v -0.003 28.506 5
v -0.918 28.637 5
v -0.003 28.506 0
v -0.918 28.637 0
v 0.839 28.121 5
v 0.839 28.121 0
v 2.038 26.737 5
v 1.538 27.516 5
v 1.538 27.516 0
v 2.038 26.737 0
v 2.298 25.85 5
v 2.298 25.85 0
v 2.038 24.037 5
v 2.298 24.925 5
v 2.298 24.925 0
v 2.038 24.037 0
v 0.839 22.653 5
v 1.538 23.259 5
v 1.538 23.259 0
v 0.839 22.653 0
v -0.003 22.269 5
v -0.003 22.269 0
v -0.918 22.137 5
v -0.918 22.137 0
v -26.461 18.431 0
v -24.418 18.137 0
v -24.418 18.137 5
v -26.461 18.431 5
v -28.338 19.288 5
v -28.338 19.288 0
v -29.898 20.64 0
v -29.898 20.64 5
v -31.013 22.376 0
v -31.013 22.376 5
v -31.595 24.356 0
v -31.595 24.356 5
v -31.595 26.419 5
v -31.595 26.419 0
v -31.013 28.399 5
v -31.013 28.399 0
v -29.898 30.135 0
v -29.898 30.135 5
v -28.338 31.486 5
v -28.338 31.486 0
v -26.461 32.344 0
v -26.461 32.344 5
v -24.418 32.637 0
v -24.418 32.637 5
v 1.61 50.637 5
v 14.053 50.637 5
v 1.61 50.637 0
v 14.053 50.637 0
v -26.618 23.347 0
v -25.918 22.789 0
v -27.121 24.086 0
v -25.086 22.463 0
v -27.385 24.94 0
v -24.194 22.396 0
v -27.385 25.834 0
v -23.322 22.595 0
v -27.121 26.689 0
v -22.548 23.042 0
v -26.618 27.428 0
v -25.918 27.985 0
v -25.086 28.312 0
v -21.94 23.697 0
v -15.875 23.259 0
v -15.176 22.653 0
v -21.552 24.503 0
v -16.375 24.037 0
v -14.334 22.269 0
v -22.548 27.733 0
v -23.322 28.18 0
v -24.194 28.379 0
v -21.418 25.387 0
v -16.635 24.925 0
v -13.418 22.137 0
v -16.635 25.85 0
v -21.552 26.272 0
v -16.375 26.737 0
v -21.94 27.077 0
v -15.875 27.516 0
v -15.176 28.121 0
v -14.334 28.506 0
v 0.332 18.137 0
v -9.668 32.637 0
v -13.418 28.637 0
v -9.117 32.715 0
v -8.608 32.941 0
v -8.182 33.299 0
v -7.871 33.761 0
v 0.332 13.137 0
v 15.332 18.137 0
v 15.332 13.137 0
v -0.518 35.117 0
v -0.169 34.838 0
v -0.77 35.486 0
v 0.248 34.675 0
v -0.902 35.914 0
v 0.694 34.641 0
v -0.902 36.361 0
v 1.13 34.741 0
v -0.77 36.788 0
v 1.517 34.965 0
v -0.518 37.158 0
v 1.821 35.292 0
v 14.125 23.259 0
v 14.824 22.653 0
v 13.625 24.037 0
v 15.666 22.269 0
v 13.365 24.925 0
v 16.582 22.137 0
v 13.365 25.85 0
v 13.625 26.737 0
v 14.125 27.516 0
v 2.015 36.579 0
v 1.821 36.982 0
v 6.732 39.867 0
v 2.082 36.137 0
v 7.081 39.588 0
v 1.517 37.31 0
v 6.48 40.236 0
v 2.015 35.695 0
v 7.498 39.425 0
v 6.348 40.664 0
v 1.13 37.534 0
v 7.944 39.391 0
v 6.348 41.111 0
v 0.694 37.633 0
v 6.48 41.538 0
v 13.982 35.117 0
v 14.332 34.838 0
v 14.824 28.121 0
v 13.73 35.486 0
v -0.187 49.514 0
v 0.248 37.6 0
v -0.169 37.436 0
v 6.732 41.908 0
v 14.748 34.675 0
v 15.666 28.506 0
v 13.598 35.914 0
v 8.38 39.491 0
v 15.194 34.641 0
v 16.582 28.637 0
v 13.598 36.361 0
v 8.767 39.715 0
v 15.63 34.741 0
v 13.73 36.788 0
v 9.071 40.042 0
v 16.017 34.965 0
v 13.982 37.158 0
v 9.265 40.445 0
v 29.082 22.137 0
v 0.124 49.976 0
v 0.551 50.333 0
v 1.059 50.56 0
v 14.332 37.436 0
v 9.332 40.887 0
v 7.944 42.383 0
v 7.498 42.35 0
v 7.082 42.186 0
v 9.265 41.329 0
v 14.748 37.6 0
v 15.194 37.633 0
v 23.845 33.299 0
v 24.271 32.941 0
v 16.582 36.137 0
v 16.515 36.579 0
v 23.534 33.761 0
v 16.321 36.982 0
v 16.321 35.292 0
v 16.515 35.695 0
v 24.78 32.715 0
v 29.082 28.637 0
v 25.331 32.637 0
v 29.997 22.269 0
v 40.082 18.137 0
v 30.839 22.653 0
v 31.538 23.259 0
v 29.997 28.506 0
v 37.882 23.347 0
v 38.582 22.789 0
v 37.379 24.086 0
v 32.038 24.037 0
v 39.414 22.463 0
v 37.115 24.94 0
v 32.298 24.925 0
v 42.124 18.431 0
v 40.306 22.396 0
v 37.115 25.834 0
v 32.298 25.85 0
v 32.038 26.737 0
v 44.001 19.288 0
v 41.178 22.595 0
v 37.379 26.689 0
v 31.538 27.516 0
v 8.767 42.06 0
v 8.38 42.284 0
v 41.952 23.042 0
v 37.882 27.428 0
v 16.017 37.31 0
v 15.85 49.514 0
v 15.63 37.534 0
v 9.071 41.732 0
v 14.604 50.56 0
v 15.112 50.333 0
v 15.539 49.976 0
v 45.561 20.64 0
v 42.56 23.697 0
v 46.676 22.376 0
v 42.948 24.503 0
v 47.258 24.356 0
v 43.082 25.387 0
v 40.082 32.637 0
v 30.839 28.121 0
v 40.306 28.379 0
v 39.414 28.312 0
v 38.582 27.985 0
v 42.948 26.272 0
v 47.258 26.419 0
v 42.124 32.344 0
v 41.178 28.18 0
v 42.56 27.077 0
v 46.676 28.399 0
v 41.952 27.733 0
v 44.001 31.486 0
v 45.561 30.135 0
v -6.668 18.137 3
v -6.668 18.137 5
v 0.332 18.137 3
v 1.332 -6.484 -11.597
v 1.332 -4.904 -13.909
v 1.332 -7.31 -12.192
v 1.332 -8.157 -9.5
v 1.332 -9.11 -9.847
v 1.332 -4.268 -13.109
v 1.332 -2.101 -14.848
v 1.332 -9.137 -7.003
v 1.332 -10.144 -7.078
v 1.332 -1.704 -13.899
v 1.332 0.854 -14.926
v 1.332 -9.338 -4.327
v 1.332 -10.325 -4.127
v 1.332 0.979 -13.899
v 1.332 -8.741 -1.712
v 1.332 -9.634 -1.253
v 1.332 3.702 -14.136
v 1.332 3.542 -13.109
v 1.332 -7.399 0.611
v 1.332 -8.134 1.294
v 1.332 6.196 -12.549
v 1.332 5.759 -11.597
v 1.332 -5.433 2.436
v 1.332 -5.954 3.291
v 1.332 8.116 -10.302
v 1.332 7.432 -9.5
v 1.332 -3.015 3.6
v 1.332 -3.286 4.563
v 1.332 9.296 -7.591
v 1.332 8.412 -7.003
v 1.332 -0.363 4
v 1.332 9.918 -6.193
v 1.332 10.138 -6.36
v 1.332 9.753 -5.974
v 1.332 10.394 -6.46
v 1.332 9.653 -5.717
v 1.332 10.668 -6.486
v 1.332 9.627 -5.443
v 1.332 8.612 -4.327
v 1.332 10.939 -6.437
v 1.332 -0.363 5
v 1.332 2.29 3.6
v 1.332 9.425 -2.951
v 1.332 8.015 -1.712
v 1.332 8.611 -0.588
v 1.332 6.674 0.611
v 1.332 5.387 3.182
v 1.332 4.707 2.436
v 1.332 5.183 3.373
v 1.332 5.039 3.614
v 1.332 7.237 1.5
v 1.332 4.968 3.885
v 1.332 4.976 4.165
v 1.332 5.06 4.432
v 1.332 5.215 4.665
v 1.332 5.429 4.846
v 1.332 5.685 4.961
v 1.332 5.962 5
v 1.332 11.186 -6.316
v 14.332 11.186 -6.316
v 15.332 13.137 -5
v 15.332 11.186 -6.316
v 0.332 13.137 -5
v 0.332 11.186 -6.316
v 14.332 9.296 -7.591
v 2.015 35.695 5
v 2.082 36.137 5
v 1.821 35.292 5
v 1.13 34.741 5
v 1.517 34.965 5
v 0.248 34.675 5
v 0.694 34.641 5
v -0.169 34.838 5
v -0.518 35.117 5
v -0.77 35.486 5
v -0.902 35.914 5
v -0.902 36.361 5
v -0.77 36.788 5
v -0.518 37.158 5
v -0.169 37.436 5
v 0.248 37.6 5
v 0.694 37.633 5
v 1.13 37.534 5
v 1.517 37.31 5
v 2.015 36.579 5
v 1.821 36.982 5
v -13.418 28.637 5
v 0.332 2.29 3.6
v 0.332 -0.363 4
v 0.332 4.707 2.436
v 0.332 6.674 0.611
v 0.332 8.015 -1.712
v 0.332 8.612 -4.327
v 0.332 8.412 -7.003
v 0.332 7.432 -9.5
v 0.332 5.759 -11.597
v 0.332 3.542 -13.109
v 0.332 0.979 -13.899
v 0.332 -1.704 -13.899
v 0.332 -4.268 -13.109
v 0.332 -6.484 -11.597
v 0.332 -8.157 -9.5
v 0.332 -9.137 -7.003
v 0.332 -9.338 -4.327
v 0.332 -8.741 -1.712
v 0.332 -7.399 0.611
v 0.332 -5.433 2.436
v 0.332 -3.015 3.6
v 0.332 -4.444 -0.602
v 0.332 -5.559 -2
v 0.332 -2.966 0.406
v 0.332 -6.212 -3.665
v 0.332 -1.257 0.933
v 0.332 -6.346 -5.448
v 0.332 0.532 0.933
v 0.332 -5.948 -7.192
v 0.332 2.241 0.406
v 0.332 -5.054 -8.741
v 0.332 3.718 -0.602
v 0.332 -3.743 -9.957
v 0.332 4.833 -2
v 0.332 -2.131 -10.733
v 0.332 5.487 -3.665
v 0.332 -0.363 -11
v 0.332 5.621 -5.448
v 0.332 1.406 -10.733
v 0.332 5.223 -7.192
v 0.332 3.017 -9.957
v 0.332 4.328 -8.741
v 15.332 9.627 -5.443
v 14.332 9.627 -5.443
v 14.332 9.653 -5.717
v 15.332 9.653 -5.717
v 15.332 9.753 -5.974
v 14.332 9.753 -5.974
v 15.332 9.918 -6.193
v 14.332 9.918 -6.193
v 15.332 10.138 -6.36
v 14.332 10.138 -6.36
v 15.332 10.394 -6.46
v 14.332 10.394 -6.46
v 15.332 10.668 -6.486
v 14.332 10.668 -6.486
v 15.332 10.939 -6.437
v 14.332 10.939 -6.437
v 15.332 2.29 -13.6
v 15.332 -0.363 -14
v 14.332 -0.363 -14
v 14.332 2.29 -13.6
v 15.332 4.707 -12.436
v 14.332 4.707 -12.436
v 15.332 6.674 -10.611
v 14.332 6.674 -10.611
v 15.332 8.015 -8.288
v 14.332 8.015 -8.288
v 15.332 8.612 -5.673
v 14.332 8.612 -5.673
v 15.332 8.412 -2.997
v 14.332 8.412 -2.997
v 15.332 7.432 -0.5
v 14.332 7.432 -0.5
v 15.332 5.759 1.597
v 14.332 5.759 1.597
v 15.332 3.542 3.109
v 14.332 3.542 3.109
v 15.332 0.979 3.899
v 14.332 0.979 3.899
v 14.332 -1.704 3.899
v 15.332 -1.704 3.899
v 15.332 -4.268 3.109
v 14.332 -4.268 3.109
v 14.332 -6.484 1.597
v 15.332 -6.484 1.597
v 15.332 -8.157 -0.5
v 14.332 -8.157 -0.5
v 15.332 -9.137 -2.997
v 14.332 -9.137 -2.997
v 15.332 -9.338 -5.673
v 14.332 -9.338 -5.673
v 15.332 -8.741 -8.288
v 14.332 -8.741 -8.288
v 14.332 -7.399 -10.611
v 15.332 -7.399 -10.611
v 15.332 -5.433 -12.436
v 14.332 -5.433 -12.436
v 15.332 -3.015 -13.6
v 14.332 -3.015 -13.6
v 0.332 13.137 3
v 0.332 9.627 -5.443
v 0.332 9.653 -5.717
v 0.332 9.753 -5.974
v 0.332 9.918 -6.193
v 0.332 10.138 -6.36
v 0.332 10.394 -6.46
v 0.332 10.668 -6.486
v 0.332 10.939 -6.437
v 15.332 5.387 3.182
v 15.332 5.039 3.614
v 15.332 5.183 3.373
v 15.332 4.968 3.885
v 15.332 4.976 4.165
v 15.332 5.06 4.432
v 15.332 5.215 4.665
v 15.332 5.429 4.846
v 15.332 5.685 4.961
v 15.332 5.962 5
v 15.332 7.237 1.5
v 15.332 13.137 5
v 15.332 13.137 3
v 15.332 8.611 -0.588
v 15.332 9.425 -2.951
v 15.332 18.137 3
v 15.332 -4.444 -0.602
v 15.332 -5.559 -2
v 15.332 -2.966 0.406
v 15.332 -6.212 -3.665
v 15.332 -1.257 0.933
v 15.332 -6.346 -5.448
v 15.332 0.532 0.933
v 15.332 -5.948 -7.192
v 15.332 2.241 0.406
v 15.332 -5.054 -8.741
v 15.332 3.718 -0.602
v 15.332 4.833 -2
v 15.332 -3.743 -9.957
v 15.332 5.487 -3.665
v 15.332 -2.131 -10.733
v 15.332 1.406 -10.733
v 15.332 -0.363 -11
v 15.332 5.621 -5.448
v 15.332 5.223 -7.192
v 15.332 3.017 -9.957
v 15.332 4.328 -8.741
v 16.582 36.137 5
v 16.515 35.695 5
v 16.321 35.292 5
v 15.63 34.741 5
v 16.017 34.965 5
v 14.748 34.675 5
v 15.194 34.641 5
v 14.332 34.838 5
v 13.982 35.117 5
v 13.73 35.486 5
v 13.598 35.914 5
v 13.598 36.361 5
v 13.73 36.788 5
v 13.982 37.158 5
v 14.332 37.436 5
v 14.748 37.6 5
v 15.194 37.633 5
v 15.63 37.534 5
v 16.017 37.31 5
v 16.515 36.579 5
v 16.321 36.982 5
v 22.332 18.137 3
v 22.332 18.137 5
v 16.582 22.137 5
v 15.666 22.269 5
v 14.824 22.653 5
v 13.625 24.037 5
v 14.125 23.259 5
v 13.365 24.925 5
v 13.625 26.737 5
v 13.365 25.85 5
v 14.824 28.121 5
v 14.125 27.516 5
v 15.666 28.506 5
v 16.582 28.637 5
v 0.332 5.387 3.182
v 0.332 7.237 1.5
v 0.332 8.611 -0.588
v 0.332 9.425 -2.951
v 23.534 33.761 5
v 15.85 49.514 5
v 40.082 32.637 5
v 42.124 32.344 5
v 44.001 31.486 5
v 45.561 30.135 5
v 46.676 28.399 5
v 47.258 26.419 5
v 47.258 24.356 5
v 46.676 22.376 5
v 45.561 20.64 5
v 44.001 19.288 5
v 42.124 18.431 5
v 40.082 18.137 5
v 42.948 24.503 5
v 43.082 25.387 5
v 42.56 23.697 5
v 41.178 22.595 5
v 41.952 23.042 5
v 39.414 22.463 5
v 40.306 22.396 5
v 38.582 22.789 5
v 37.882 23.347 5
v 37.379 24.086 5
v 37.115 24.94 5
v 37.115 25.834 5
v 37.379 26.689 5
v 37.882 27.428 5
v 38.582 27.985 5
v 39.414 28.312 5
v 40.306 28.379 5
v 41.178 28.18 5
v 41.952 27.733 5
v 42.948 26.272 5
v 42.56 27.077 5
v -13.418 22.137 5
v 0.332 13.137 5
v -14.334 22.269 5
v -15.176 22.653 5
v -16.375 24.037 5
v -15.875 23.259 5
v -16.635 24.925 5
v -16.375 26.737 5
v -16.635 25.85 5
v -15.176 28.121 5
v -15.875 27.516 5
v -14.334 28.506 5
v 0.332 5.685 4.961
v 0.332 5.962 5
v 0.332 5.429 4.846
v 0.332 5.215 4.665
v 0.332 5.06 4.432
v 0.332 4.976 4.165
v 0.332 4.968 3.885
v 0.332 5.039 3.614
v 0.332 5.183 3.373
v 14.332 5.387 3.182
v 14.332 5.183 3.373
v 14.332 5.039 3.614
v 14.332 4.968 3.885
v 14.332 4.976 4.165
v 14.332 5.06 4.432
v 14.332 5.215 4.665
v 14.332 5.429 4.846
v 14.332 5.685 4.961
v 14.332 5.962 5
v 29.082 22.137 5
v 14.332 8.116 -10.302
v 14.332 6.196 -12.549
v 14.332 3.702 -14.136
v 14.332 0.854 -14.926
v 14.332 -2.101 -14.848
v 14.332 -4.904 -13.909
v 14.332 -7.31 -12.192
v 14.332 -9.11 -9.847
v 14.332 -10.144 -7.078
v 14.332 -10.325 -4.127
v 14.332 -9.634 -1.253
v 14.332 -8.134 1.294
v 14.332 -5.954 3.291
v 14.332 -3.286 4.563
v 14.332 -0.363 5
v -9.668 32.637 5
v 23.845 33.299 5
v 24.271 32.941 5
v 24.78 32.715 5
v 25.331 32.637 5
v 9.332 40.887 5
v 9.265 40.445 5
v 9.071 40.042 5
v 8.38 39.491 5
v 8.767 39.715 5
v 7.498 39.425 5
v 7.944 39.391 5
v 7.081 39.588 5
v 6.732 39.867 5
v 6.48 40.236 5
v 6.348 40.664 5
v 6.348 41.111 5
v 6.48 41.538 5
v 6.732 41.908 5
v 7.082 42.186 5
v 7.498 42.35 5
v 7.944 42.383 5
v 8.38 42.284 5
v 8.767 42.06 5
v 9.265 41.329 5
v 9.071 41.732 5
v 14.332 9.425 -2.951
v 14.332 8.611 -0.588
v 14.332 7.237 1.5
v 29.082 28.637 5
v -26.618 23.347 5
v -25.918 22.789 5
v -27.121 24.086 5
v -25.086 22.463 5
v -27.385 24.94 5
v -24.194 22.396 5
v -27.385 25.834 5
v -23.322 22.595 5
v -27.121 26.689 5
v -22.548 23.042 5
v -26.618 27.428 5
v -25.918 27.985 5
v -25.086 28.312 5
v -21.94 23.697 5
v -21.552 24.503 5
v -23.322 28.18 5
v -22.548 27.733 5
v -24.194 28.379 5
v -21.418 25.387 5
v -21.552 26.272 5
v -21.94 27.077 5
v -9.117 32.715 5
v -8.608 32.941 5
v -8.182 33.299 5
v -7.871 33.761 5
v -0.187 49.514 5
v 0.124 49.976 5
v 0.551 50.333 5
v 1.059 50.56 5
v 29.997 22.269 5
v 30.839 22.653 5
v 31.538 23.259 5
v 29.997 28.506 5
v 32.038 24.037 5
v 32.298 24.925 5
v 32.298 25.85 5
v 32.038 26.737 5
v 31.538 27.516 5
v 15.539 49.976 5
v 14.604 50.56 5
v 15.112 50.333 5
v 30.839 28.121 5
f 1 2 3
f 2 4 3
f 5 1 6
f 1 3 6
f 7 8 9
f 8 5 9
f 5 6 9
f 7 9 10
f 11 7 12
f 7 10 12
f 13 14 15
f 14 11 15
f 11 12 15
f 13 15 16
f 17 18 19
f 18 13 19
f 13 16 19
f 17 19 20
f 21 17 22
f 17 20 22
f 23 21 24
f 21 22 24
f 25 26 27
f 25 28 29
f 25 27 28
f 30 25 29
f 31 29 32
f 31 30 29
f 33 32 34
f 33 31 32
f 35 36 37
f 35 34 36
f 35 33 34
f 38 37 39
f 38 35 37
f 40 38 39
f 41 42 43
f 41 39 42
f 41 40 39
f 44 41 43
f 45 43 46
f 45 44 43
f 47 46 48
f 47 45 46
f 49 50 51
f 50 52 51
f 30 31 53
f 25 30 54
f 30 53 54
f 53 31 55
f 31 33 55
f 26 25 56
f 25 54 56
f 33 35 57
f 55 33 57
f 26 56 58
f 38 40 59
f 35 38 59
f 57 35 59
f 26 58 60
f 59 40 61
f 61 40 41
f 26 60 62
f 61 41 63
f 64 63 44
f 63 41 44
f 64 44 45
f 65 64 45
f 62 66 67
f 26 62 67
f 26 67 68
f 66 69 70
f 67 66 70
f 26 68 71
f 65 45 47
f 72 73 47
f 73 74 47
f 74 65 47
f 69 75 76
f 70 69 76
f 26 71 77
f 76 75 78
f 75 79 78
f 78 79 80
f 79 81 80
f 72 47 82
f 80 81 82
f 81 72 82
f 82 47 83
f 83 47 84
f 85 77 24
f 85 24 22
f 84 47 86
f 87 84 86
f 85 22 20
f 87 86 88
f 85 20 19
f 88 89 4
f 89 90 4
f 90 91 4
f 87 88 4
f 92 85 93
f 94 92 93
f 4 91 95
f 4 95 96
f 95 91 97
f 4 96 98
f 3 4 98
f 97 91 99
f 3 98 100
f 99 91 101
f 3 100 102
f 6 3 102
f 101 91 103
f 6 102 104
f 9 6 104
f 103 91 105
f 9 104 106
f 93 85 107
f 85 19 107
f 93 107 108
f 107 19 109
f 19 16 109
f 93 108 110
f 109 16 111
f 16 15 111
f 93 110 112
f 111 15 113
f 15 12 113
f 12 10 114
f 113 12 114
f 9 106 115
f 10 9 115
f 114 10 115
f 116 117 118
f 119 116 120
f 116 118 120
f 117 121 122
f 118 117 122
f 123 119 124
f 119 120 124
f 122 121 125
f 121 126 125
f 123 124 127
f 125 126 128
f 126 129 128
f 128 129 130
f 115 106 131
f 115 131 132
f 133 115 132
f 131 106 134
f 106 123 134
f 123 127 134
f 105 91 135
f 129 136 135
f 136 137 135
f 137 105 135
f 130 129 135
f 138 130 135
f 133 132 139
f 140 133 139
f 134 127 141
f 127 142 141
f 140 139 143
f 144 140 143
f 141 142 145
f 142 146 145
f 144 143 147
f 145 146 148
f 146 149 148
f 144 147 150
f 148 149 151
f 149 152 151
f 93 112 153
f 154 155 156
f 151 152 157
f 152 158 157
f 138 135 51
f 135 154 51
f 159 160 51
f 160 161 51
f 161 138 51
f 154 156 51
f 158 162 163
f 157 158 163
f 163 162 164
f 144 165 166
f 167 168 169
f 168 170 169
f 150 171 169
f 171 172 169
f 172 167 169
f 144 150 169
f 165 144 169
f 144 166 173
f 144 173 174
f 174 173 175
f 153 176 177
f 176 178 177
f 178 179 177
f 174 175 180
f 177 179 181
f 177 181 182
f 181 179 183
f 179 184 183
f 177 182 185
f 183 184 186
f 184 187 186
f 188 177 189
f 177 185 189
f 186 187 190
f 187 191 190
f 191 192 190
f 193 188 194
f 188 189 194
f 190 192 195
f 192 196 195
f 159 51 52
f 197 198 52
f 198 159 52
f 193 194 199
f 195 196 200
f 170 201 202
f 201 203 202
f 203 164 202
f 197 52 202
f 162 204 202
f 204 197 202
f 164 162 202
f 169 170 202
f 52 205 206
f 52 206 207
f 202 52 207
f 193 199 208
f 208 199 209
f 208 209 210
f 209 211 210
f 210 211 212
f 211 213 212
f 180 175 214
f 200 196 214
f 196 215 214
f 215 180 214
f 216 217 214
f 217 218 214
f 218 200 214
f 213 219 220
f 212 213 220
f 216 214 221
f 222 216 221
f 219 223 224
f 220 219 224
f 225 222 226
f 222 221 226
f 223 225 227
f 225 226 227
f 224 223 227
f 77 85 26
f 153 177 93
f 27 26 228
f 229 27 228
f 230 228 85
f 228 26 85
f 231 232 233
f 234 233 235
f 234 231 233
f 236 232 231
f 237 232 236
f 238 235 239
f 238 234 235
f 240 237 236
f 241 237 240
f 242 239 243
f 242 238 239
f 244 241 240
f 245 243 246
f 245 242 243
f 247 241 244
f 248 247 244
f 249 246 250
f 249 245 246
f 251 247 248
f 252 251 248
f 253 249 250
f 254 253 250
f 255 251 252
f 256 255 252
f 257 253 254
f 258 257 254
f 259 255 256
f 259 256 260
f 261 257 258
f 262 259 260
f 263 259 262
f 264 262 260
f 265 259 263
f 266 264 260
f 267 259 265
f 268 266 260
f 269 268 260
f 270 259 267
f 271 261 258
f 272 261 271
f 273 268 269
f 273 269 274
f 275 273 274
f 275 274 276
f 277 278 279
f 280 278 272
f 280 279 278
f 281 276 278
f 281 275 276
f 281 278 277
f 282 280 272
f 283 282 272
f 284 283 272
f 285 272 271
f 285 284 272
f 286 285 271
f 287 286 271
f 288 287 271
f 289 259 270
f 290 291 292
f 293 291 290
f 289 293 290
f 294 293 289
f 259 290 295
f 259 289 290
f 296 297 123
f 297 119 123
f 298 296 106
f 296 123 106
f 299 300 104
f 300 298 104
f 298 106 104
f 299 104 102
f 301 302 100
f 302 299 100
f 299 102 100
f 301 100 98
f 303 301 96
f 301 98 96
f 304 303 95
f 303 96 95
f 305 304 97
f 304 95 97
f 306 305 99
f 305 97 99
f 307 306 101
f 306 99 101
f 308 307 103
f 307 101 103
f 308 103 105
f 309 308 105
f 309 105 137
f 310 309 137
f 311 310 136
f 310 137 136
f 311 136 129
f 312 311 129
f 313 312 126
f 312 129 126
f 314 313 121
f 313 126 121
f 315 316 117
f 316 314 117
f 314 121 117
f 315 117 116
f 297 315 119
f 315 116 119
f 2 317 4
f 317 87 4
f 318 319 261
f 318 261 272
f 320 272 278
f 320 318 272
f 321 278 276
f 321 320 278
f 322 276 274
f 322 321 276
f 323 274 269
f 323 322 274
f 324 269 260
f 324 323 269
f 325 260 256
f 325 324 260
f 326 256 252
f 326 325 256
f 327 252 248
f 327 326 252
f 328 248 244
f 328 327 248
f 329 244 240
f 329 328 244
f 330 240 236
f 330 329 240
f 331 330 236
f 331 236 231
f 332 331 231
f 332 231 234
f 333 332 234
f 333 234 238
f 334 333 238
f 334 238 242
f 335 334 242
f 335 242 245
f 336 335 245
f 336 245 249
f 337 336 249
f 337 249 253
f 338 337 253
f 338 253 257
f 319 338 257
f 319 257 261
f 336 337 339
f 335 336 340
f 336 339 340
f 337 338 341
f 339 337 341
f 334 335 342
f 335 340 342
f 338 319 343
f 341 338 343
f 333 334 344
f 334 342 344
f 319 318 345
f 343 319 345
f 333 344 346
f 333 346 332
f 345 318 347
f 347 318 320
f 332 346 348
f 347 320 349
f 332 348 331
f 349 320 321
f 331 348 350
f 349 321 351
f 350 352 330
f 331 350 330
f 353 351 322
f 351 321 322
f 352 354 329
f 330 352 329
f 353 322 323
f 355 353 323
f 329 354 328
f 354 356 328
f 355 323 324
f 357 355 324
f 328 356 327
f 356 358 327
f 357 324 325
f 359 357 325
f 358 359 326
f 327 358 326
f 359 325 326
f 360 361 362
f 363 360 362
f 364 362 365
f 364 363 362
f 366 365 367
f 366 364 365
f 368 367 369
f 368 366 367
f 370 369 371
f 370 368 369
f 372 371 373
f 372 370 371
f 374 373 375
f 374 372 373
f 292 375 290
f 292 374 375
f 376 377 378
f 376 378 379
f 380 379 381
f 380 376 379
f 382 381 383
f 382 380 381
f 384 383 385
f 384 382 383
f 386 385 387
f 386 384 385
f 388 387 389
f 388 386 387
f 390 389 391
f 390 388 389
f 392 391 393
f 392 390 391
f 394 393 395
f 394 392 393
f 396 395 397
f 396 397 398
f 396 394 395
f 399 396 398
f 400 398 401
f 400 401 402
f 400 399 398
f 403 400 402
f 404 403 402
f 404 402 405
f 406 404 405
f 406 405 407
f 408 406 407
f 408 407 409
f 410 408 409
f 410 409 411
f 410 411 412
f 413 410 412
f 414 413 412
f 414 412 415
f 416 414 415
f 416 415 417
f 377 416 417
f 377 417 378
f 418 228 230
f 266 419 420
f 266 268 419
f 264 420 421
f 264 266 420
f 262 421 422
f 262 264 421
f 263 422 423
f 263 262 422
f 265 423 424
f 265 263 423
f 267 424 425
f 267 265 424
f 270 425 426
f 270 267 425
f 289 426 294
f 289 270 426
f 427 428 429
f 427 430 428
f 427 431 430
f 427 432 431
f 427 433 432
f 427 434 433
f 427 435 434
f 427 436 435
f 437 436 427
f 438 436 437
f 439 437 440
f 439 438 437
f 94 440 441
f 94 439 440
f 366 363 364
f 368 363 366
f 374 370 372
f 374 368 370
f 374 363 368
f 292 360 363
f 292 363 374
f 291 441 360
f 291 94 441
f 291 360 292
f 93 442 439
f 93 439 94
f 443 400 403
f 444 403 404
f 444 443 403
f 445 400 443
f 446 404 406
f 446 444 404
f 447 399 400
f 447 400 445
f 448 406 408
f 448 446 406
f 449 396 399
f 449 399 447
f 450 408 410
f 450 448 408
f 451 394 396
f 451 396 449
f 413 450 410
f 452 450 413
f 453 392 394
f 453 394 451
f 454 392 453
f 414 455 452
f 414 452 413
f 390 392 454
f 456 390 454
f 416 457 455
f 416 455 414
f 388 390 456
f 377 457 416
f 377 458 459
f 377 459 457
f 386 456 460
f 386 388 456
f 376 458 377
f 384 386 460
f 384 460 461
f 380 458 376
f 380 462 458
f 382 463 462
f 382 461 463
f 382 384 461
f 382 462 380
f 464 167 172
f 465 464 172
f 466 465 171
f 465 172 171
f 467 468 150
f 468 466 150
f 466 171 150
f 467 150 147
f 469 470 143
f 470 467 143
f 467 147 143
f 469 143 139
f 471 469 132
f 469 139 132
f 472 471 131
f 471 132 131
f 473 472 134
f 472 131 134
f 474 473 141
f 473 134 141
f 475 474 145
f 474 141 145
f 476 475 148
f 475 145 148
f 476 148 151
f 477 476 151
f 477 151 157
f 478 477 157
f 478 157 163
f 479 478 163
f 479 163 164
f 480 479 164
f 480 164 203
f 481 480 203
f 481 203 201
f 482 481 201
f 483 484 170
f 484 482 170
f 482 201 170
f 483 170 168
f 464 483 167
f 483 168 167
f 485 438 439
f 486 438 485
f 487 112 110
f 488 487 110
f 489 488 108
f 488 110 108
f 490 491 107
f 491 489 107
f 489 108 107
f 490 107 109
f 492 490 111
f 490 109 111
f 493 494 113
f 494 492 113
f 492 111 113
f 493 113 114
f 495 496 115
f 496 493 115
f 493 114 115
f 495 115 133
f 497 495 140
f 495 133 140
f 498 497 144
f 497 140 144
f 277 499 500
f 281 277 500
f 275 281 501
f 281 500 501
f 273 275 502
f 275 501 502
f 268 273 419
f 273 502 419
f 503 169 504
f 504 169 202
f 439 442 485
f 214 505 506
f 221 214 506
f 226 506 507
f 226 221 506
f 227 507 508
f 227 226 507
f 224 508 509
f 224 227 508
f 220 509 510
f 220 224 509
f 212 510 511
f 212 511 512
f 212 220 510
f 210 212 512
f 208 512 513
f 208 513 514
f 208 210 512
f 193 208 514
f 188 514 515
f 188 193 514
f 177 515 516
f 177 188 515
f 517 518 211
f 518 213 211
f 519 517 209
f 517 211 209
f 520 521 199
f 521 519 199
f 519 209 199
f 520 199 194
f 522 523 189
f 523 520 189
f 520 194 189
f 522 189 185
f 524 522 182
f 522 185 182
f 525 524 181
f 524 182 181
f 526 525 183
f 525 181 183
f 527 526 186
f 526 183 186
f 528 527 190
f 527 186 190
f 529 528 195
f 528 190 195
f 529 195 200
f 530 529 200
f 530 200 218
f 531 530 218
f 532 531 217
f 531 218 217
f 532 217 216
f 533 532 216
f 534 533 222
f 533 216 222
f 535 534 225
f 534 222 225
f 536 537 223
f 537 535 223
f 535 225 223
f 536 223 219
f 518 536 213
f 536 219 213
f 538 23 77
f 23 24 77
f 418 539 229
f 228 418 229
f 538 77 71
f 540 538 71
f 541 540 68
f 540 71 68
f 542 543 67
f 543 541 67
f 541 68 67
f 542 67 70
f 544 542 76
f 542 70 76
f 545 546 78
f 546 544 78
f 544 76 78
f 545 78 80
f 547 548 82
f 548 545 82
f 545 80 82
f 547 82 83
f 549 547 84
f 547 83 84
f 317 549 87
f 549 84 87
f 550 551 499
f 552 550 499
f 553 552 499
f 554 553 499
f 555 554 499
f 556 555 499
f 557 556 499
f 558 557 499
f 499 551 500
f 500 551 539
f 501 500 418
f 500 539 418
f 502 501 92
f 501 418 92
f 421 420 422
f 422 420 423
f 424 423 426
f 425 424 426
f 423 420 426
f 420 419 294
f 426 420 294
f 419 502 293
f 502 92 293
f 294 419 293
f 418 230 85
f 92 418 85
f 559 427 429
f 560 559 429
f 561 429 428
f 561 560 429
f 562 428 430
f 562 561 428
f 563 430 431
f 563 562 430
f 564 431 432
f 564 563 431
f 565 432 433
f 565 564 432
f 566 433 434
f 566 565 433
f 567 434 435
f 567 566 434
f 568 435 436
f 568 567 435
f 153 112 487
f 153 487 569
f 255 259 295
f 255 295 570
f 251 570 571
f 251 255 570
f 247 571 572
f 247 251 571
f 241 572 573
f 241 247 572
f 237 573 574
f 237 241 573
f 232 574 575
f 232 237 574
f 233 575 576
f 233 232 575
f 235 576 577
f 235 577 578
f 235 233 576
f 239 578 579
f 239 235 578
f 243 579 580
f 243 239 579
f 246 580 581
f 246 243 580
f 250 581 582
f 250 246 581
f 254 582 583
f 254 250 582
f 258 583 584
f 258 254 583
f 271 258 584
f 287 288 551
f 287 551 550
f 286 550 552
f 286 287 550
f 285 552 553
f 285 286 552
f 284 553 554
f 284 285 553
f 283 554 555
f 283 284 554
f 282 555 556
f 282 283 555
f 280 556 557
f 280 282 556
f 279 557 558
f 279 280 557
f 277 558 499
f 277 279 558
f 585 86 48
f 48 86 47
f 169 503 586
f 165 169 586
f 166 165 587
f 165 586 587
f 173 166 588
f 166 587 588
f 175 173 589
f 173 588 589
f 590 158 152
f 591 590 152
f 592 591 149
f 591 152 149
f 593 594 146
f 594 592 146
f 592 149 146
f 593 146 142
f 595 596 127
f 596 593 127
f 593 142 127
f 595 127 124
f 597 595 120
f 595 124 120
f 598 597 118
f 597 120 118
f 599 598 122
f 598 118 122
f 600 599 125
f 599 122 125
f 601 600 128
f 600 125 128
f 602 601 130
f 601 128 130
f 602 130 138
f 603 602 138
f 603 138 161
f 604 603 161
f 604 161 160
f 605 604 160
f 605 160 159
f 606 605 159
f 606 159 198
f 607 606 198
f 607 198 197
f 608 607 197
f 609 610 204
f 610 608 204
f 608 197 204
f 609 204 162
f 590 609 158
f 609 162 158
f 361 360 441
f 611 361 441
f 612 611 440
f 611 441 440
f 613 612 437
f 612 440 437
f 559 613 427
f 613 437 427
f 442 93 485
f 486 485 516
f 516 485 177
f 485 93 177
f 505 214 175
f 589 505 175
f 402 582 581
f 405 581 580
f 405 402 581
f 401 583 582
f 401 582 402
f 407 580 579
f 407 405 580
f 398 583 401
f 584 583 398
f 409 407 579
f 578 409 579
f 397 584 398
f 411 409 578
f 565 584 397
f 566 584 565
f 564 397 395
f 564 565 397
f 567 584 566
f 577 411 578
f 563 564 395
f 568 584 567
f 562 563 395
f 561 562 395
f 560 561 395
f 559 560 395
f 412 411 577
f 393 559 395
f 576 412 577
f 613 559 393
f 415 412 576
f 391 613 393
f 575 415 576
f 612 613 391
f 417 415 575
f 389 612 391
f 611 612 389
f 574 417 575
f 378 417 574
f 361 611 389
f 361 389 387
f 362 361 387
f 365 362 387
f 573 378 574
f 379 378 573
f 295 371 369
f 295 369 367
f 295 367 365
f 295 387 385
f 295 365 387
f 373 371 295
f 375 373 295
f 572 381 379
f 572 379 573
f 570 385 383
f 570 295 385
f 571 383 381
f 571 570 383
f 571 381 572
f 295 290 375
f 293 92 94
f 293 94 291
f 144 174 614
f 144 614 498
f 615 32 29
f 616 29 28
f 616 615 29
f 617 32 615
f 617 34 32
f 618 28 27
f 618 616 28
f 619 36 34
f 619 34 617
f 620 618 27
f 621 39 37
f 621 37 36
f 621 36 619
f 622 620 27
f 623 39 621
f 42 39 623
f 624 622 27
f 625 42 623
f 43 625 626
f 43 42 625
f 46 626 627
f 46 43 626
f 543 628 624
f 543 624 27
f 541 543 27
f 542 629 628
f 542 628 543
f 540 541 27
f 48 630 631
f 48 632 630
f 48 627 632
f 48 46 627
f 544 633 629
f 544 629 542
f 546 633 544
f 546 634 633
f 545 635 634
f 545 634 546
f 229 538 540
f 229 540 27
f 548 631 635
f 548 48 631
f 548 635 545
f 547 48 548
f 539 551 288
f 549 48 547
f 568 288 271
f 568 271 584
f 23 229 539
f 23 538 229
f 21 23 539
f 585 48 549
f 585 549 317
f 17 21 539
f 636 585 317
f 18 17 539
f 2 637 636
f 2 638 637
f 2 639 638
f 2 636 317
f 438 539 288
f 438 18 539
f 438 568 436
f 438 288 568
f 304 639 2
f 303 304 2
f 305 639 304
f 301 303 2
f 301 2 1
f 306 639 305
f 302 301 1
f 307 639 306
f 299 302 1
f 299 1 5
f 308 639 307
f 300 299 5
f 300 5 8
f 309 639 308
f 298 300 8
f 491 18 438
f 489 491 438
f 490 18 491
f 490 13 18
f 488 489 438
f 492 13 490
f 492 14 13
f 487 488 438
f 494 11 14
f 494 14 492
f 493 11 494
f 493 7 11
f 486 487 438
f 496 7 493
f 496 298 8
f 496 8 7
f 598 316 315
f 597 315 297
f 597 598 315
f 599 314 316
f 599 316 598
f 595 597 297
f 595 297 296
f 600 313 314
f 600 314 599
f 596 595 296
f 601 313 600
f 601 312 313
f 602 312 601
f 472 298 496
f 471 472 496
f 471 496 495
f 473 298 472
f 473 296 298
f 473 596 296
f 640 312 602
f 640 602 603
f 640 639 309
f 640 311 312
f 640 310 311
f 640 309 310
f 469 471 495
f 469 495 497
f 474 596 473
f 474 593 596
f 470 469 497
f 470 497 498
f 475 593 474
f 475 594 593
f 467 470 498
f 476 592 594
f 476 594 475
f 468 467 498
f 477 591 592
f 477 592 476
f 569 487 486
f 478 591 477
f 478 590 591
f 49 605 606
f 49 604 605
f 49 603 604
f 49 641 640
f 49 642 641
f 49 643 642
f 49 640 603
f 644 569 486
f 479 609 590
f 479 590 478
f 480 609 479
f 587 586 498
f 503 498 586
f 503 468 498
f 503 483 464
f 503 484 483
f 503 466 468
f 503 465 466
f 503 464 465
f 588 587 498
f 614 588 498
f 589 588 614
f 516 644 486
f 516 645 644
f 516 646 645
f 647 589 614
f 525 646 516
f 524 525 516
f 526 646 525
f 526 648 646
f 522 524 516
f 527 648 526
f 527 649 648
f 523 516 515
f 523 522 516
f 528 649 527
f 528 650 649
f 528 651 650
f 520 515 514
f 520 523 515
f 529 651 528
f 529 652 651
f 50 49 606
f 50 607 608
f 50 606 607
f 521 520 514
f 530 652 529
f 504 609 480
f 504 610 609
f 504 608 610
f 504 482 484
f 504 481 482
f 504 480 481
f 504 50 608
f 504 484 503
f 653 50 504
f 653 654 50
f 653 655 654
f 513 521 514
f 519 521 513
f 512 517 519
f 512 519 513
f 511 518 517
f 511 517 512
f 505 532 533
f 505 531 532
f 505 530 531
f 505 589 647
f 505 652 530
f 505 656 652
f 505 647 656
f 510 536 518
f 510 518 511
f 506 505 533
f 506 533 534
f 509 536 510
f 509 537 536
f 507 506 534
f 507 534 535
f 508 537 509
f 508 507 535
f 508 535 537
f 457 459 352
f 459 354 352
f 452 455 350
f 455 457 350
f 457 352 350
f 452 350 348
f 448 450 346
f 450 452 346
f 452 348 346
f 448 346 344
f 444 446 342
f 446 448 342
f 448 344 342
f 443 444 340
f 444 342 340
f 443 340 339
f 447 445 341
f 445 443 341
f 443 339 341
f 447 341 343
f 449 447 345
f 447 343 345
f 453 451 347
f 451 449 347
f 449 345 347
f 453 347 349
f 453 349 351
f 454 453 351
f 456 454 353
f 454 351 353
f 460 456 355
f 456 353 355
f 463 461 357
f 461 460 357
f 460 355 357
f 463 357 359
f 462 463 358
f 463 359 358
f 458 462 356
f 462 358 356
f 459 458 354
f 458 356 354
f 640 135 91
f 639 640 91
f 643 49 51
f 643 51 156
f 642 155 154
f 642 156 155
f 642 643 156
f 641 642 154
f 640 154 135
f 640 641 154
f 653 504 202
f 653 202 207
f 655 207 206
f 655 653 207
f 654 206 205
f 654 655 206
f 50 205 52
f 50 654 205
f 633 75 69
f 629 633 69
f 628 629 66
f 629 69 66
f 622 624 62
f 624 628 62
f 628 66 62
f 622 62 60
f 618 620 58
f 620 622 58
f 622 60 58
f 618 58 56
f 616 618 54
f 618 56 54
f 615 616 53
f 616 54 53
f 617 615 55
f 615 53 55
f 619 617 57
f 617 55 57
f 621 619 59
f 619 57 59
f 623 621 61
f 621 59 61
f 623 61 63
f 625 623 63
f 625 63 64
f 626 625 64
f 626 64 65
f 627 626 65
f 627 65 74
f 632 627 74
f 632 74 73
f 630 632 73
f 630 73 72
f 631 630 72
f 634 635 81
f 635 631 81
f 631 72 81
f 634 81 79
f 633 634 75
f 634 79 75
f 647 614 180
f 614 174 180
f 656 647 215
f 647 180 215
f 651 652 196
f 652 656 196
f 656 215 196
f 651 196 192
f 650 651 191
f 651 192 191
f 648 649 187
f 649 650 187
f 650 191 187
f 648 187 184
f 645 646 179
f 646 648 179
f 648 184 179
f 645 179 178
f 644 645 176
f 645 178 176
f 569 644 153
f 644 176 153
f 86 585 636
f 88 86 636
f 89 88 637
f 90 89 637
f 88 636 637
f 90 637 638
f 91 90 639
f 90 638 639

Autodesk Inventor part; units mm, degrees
ref_plane "YZ Plane" through (0, 0, 0) normal (1, 0, 0) x (0, 1, 0)
ref_plane "XZ Plane" through (0, 0, 0) normal (0, 1, 0) x (-1, 0, 0)
sketch "Body" plane through (0, 0, 0) normal (0, 0, 1) x (1, 0, 0)
  line L0 (-42.1685, 50.6373) -> (57.8315, 50.6373) construction
  line L1 (-42.1685, 50.6373) -> (-42.1685, 45.6373) construction
  line L2 (-42.1685, 45.6373) -> (-31.6685, 45.6373) construction
  line L3 (-31.6685, 45.6373) -> (-31.6685, 18.1373) construction
  line L4 (-31.6685, 18.1373) -> (-42.1685, 18.1373) construction
  line L5 (-42.1685, 18.1373) -> (-42.1685, 13.1373) construction
  line L6 (-42.1685, 13.1373) -> (57.8315, 13.1373) construction
  line L7 (57.8315, 18.1373) -> (57.8315, 13.1373) construction
  line L8 (47.3315, 18.1373) -> (57.8315, 18.1373) construction
  line L9 (47.3315, 45.6373) -> (47.3315, 18.1373) construction
  line L10 (57.8315, 45.6373) -> (47.3315, 45.6373) construction
  line L11 (57.8315, 50.6373) -> (57.8315, 45.6373) construction
  circle A0 centre (40.0815, 25.3873) radius 3.25 construction
  arc A1 (28.5815, 34.3873) -> (28.5815, 37.8873) centre (28.5815, 36.1373) ccw construction
  line L12 (15.0815, 34.3873) -> (28.5815, 34.3873) construction
  arc A2 (15.0815, 37.8873) -> (15.0815, 34.3873) centre (15.0815, 36.1373) ccw construction
  line L13 (28.5815, 37.8873) -> (15.0815, 37.8873) construction
  line L14 (29.0815, 28.6373) -> (16.5815, 28.6373) projected
  arc A3 (29.0815, 22.1373) -> (29.0815, 28.6373) centre (29.0815, 25.3873) ccw projected
  line L15 (16.5815, 22.1373) -> (29.0815, 22.1373) projected
  arc A4 (16.5815, 28.6373) -> (16.5815, 22.1373) centre (16.5815, 25.3873) ccw projected
  line L16 (-13.4185, 28.6373) -> (-0.9185, 28.6373) projected
  arc A5 (-0.9185, 22.1373) -> (-0.9185, 28.6373) centre (-0.9185, 25.3873) ccw projected
  line L17 (-0.9185, 22.1373) -> (-13.4185, 22.1373) projected
  arc A6 (-13.4185, 28.6373) -> (-13.4185, 22.1373) centre (-13.4185, 25.3873) ccw projected
  arc A7 (-12.9185, 37.8873) -> (-12.9185, 34.3873) centre (-12.9185, 36.1373) ccw construction
  line L18 (-12.9185, 37.8873) -> (0.5815, 37.8873) construction
  arc A8 (0.5815, 34.3873) -> (0.5815, 37.8873) centre (0.5815, 36.1373) ccw construction
  line L19 (0.5815, 34.3873) -> (-12.9185, 34.3873) construction
  circle A9 centre (-24.4185, 25.3873) radius 3.25 construction
  line L20 (6.8315, 42.6373) -> (8.8315, 42.6373) construction
  arc A10 (8.8315, 39.1373) -> (8.8315, 42.6373) centre (8.8315, 40.8873) ccw construction
  line L21 (6.8315, 39.1373) -> (8.8315, 39.1373) construction
  arc A11 (6.8315, 42.6373) -> (6.8315, 39.1373) centre (6.8315, 40.8873) ccw construction
  circle A12 centre (40.0815, 25.3873) radius 7.25
  circle A13 centre (-24.4185, 25.3873) radius 7.25
  line L22 (40.0815, 25.3873) -> (40.0815, 18.1373) construction
  line L23 (-24.4185, 18.1373) -> (40.0815, 18.1373)
  line L24 (-24.4185, 25.3873) -> (-24.4185, 18.1373) construction
  line L25 (40.0815, 25.3873) -> (40.0815, 32.6373) construction
  line L26 (-24.4185, 25.3873) -> (-24.4185, 32.6373) construction
  line L27 (40.0815, 32.6373) -> (24.0815, 32.6373)
  line L28 (24.0815, 32.6373) -> (15.3024, 50.6373)
  line L29 (15.3024, 50.6373) -> (0.3607, 50.6373)
  line L30 (0.3607, 50.6373) -> (-8.4185, 32.6373)
  line L31 (-8.4185, 32.6373) -> (-24.4185, 32.6373)
  line L32 (8.8315, 40.8873) -> (6.8315, 40.8873) construction
  circle A14 centre (7.8315, 40.8873) radius 1.5
  circle A15 centre (0.5815, 36.1373) radius 1.5
  circle A16 centre (15.0815, 36.1373) radius 1.5
  circle A17 centre (40.0815, 25.3873) radius 3
  circle A18 centre (-24.4185, 25.3873) radius 3
  dimension "d2" = 16
  dimension "d3" = 16
  dimension "d4" = 116
  dimension "d8" = 3
  dimension "d9" = 3
  dimension "d10" = 3
  dimension "d11" = 6
  dimension "d12" = 6
extrude "BodyFeature" add sketch "Body" along normal blind 5
fillet "BodyFilletsFeature" radius 2 4 edges at (24.0815, 32.6373, 2.5) (-8.4185, 32.6373, 2.5) (0.3607, 50.6373, 2.5) (15.3024, 50.6373, 2.5)
ref_plane "MiddlePlane" through (7.8315, 65.9547, 5) normal (1, 0, 0) x (0, 0, -1)
sketch "PelvisSpineBase" plane through (7.8315, 65.9547, 5) normal (1, 0, 0) x (0, 0, -1)
  arc A0 (0, -66.3174) -> (12.5911, -56.659) centre (10, -66.3174) ccw
  circle A1 centre (10, -66.3174) radius 6
  line L0 (5, -33.3174) -> (5, -47.8174) construction
  line L1 (5, -47.8174) -> (0, -47.8174)
  line L2 (0, -47.8174) -> (0, -66.3174)
  line L3 (5, -47.8174) -> (5, -52.8174)
  line L4 (5, -52.8174) -> (10, -52.8174)
  line L5 (10, -52.8174) -> (12.5911, -56.659)
  dimension "d16" = 12
  dimension "d17" = 4
  dimension "d22" = 5
  dimension "d23" = 5
  dimension "d29" = 18.5
  dimension "d30" = 34
extrude "PelvisSpineBaseFeature" add sketch "PelvisSpineBase" along normal mid plane 15
sketch "AngleReinforce" plane through (0, 0, 5) normal (0, 0, 1) x (1, 0, 0)
  line L0 (15.3315, 18.1373) -> (15.3315, 13.1373)
  line L1 (15.3315, 13.1373) -> (15.3315, 18.1373) projected
  line L2 (15.3315, 13.1373) -> (22.3315, 18.1373)
  line L3 (15.3315, 18.1373) -> (40.0815, 18.1373) construction
  line L4 (15.3315, 18.1373) -> (22.3315, 18.1373)
  line L5 (0.3315, 18.1373) -> (0.3315, 13.1373)
  line L6 (0.3315, 18.1373) -> (0.3315, 13.1373) projected
  line L7 (0.3315, 13.1373) -> (-6.6685, 18.1373)
  line L8 (-24.4185, 18.1373) -> (0.3315, 18.1373) construction
  line L9 (0.3315, 18.1373) -> (-6.6685, 18.1373)
  dimension "d33" = 7
  dimension "d34" = 7
extrude "AngleReinforceFeature" add sketch "AngleReinforce" against normal blind 2
sketch "RightLip" plane through (15.3315, 65.9547, 5) normal (1, 0, 0) x (0, 0, -1)
  arc A0 (0, -66.3174) -> (12.5911, -56.659) centre (10, -66.3174) ccw projected
  circle A1 centre (10, -66.3174) radius 10
  circle A2 centre (10, -66.3174) radius 9
  dimension "d37" = 1
extrude "RightLipFeature" cut sketch "RightLip" against normal blind 1
sketch "LeftLip" plane through (0.3315, 65.9547, 5) normal (-1, 0, 0) x (0, 0, 1)
  arc A0 (-12.5911, -56.659) -> (0, -66.3174) centre (-10, -66.3174) ccw projected
  circle A1 centre (-10, -66.3174) radius 9
  circle A2 centre (-10, -66.3174) radius 10
  dimension "d40" = 1
extrude "LeftLipFeature" cut sketch "LeftLip" against normal blind 1
fillet "SharpEdgesFilletFeature" radius 1 4 edges at (0.8315, -0.3627, 5) (0.8315, 9.2958, -7.5911) (14.8315, 9.2958, -7.5911) (14.8315, -0.3627, 5)
equation "\"d3\" = d2"
properties part number "PelvisSpineLink"
